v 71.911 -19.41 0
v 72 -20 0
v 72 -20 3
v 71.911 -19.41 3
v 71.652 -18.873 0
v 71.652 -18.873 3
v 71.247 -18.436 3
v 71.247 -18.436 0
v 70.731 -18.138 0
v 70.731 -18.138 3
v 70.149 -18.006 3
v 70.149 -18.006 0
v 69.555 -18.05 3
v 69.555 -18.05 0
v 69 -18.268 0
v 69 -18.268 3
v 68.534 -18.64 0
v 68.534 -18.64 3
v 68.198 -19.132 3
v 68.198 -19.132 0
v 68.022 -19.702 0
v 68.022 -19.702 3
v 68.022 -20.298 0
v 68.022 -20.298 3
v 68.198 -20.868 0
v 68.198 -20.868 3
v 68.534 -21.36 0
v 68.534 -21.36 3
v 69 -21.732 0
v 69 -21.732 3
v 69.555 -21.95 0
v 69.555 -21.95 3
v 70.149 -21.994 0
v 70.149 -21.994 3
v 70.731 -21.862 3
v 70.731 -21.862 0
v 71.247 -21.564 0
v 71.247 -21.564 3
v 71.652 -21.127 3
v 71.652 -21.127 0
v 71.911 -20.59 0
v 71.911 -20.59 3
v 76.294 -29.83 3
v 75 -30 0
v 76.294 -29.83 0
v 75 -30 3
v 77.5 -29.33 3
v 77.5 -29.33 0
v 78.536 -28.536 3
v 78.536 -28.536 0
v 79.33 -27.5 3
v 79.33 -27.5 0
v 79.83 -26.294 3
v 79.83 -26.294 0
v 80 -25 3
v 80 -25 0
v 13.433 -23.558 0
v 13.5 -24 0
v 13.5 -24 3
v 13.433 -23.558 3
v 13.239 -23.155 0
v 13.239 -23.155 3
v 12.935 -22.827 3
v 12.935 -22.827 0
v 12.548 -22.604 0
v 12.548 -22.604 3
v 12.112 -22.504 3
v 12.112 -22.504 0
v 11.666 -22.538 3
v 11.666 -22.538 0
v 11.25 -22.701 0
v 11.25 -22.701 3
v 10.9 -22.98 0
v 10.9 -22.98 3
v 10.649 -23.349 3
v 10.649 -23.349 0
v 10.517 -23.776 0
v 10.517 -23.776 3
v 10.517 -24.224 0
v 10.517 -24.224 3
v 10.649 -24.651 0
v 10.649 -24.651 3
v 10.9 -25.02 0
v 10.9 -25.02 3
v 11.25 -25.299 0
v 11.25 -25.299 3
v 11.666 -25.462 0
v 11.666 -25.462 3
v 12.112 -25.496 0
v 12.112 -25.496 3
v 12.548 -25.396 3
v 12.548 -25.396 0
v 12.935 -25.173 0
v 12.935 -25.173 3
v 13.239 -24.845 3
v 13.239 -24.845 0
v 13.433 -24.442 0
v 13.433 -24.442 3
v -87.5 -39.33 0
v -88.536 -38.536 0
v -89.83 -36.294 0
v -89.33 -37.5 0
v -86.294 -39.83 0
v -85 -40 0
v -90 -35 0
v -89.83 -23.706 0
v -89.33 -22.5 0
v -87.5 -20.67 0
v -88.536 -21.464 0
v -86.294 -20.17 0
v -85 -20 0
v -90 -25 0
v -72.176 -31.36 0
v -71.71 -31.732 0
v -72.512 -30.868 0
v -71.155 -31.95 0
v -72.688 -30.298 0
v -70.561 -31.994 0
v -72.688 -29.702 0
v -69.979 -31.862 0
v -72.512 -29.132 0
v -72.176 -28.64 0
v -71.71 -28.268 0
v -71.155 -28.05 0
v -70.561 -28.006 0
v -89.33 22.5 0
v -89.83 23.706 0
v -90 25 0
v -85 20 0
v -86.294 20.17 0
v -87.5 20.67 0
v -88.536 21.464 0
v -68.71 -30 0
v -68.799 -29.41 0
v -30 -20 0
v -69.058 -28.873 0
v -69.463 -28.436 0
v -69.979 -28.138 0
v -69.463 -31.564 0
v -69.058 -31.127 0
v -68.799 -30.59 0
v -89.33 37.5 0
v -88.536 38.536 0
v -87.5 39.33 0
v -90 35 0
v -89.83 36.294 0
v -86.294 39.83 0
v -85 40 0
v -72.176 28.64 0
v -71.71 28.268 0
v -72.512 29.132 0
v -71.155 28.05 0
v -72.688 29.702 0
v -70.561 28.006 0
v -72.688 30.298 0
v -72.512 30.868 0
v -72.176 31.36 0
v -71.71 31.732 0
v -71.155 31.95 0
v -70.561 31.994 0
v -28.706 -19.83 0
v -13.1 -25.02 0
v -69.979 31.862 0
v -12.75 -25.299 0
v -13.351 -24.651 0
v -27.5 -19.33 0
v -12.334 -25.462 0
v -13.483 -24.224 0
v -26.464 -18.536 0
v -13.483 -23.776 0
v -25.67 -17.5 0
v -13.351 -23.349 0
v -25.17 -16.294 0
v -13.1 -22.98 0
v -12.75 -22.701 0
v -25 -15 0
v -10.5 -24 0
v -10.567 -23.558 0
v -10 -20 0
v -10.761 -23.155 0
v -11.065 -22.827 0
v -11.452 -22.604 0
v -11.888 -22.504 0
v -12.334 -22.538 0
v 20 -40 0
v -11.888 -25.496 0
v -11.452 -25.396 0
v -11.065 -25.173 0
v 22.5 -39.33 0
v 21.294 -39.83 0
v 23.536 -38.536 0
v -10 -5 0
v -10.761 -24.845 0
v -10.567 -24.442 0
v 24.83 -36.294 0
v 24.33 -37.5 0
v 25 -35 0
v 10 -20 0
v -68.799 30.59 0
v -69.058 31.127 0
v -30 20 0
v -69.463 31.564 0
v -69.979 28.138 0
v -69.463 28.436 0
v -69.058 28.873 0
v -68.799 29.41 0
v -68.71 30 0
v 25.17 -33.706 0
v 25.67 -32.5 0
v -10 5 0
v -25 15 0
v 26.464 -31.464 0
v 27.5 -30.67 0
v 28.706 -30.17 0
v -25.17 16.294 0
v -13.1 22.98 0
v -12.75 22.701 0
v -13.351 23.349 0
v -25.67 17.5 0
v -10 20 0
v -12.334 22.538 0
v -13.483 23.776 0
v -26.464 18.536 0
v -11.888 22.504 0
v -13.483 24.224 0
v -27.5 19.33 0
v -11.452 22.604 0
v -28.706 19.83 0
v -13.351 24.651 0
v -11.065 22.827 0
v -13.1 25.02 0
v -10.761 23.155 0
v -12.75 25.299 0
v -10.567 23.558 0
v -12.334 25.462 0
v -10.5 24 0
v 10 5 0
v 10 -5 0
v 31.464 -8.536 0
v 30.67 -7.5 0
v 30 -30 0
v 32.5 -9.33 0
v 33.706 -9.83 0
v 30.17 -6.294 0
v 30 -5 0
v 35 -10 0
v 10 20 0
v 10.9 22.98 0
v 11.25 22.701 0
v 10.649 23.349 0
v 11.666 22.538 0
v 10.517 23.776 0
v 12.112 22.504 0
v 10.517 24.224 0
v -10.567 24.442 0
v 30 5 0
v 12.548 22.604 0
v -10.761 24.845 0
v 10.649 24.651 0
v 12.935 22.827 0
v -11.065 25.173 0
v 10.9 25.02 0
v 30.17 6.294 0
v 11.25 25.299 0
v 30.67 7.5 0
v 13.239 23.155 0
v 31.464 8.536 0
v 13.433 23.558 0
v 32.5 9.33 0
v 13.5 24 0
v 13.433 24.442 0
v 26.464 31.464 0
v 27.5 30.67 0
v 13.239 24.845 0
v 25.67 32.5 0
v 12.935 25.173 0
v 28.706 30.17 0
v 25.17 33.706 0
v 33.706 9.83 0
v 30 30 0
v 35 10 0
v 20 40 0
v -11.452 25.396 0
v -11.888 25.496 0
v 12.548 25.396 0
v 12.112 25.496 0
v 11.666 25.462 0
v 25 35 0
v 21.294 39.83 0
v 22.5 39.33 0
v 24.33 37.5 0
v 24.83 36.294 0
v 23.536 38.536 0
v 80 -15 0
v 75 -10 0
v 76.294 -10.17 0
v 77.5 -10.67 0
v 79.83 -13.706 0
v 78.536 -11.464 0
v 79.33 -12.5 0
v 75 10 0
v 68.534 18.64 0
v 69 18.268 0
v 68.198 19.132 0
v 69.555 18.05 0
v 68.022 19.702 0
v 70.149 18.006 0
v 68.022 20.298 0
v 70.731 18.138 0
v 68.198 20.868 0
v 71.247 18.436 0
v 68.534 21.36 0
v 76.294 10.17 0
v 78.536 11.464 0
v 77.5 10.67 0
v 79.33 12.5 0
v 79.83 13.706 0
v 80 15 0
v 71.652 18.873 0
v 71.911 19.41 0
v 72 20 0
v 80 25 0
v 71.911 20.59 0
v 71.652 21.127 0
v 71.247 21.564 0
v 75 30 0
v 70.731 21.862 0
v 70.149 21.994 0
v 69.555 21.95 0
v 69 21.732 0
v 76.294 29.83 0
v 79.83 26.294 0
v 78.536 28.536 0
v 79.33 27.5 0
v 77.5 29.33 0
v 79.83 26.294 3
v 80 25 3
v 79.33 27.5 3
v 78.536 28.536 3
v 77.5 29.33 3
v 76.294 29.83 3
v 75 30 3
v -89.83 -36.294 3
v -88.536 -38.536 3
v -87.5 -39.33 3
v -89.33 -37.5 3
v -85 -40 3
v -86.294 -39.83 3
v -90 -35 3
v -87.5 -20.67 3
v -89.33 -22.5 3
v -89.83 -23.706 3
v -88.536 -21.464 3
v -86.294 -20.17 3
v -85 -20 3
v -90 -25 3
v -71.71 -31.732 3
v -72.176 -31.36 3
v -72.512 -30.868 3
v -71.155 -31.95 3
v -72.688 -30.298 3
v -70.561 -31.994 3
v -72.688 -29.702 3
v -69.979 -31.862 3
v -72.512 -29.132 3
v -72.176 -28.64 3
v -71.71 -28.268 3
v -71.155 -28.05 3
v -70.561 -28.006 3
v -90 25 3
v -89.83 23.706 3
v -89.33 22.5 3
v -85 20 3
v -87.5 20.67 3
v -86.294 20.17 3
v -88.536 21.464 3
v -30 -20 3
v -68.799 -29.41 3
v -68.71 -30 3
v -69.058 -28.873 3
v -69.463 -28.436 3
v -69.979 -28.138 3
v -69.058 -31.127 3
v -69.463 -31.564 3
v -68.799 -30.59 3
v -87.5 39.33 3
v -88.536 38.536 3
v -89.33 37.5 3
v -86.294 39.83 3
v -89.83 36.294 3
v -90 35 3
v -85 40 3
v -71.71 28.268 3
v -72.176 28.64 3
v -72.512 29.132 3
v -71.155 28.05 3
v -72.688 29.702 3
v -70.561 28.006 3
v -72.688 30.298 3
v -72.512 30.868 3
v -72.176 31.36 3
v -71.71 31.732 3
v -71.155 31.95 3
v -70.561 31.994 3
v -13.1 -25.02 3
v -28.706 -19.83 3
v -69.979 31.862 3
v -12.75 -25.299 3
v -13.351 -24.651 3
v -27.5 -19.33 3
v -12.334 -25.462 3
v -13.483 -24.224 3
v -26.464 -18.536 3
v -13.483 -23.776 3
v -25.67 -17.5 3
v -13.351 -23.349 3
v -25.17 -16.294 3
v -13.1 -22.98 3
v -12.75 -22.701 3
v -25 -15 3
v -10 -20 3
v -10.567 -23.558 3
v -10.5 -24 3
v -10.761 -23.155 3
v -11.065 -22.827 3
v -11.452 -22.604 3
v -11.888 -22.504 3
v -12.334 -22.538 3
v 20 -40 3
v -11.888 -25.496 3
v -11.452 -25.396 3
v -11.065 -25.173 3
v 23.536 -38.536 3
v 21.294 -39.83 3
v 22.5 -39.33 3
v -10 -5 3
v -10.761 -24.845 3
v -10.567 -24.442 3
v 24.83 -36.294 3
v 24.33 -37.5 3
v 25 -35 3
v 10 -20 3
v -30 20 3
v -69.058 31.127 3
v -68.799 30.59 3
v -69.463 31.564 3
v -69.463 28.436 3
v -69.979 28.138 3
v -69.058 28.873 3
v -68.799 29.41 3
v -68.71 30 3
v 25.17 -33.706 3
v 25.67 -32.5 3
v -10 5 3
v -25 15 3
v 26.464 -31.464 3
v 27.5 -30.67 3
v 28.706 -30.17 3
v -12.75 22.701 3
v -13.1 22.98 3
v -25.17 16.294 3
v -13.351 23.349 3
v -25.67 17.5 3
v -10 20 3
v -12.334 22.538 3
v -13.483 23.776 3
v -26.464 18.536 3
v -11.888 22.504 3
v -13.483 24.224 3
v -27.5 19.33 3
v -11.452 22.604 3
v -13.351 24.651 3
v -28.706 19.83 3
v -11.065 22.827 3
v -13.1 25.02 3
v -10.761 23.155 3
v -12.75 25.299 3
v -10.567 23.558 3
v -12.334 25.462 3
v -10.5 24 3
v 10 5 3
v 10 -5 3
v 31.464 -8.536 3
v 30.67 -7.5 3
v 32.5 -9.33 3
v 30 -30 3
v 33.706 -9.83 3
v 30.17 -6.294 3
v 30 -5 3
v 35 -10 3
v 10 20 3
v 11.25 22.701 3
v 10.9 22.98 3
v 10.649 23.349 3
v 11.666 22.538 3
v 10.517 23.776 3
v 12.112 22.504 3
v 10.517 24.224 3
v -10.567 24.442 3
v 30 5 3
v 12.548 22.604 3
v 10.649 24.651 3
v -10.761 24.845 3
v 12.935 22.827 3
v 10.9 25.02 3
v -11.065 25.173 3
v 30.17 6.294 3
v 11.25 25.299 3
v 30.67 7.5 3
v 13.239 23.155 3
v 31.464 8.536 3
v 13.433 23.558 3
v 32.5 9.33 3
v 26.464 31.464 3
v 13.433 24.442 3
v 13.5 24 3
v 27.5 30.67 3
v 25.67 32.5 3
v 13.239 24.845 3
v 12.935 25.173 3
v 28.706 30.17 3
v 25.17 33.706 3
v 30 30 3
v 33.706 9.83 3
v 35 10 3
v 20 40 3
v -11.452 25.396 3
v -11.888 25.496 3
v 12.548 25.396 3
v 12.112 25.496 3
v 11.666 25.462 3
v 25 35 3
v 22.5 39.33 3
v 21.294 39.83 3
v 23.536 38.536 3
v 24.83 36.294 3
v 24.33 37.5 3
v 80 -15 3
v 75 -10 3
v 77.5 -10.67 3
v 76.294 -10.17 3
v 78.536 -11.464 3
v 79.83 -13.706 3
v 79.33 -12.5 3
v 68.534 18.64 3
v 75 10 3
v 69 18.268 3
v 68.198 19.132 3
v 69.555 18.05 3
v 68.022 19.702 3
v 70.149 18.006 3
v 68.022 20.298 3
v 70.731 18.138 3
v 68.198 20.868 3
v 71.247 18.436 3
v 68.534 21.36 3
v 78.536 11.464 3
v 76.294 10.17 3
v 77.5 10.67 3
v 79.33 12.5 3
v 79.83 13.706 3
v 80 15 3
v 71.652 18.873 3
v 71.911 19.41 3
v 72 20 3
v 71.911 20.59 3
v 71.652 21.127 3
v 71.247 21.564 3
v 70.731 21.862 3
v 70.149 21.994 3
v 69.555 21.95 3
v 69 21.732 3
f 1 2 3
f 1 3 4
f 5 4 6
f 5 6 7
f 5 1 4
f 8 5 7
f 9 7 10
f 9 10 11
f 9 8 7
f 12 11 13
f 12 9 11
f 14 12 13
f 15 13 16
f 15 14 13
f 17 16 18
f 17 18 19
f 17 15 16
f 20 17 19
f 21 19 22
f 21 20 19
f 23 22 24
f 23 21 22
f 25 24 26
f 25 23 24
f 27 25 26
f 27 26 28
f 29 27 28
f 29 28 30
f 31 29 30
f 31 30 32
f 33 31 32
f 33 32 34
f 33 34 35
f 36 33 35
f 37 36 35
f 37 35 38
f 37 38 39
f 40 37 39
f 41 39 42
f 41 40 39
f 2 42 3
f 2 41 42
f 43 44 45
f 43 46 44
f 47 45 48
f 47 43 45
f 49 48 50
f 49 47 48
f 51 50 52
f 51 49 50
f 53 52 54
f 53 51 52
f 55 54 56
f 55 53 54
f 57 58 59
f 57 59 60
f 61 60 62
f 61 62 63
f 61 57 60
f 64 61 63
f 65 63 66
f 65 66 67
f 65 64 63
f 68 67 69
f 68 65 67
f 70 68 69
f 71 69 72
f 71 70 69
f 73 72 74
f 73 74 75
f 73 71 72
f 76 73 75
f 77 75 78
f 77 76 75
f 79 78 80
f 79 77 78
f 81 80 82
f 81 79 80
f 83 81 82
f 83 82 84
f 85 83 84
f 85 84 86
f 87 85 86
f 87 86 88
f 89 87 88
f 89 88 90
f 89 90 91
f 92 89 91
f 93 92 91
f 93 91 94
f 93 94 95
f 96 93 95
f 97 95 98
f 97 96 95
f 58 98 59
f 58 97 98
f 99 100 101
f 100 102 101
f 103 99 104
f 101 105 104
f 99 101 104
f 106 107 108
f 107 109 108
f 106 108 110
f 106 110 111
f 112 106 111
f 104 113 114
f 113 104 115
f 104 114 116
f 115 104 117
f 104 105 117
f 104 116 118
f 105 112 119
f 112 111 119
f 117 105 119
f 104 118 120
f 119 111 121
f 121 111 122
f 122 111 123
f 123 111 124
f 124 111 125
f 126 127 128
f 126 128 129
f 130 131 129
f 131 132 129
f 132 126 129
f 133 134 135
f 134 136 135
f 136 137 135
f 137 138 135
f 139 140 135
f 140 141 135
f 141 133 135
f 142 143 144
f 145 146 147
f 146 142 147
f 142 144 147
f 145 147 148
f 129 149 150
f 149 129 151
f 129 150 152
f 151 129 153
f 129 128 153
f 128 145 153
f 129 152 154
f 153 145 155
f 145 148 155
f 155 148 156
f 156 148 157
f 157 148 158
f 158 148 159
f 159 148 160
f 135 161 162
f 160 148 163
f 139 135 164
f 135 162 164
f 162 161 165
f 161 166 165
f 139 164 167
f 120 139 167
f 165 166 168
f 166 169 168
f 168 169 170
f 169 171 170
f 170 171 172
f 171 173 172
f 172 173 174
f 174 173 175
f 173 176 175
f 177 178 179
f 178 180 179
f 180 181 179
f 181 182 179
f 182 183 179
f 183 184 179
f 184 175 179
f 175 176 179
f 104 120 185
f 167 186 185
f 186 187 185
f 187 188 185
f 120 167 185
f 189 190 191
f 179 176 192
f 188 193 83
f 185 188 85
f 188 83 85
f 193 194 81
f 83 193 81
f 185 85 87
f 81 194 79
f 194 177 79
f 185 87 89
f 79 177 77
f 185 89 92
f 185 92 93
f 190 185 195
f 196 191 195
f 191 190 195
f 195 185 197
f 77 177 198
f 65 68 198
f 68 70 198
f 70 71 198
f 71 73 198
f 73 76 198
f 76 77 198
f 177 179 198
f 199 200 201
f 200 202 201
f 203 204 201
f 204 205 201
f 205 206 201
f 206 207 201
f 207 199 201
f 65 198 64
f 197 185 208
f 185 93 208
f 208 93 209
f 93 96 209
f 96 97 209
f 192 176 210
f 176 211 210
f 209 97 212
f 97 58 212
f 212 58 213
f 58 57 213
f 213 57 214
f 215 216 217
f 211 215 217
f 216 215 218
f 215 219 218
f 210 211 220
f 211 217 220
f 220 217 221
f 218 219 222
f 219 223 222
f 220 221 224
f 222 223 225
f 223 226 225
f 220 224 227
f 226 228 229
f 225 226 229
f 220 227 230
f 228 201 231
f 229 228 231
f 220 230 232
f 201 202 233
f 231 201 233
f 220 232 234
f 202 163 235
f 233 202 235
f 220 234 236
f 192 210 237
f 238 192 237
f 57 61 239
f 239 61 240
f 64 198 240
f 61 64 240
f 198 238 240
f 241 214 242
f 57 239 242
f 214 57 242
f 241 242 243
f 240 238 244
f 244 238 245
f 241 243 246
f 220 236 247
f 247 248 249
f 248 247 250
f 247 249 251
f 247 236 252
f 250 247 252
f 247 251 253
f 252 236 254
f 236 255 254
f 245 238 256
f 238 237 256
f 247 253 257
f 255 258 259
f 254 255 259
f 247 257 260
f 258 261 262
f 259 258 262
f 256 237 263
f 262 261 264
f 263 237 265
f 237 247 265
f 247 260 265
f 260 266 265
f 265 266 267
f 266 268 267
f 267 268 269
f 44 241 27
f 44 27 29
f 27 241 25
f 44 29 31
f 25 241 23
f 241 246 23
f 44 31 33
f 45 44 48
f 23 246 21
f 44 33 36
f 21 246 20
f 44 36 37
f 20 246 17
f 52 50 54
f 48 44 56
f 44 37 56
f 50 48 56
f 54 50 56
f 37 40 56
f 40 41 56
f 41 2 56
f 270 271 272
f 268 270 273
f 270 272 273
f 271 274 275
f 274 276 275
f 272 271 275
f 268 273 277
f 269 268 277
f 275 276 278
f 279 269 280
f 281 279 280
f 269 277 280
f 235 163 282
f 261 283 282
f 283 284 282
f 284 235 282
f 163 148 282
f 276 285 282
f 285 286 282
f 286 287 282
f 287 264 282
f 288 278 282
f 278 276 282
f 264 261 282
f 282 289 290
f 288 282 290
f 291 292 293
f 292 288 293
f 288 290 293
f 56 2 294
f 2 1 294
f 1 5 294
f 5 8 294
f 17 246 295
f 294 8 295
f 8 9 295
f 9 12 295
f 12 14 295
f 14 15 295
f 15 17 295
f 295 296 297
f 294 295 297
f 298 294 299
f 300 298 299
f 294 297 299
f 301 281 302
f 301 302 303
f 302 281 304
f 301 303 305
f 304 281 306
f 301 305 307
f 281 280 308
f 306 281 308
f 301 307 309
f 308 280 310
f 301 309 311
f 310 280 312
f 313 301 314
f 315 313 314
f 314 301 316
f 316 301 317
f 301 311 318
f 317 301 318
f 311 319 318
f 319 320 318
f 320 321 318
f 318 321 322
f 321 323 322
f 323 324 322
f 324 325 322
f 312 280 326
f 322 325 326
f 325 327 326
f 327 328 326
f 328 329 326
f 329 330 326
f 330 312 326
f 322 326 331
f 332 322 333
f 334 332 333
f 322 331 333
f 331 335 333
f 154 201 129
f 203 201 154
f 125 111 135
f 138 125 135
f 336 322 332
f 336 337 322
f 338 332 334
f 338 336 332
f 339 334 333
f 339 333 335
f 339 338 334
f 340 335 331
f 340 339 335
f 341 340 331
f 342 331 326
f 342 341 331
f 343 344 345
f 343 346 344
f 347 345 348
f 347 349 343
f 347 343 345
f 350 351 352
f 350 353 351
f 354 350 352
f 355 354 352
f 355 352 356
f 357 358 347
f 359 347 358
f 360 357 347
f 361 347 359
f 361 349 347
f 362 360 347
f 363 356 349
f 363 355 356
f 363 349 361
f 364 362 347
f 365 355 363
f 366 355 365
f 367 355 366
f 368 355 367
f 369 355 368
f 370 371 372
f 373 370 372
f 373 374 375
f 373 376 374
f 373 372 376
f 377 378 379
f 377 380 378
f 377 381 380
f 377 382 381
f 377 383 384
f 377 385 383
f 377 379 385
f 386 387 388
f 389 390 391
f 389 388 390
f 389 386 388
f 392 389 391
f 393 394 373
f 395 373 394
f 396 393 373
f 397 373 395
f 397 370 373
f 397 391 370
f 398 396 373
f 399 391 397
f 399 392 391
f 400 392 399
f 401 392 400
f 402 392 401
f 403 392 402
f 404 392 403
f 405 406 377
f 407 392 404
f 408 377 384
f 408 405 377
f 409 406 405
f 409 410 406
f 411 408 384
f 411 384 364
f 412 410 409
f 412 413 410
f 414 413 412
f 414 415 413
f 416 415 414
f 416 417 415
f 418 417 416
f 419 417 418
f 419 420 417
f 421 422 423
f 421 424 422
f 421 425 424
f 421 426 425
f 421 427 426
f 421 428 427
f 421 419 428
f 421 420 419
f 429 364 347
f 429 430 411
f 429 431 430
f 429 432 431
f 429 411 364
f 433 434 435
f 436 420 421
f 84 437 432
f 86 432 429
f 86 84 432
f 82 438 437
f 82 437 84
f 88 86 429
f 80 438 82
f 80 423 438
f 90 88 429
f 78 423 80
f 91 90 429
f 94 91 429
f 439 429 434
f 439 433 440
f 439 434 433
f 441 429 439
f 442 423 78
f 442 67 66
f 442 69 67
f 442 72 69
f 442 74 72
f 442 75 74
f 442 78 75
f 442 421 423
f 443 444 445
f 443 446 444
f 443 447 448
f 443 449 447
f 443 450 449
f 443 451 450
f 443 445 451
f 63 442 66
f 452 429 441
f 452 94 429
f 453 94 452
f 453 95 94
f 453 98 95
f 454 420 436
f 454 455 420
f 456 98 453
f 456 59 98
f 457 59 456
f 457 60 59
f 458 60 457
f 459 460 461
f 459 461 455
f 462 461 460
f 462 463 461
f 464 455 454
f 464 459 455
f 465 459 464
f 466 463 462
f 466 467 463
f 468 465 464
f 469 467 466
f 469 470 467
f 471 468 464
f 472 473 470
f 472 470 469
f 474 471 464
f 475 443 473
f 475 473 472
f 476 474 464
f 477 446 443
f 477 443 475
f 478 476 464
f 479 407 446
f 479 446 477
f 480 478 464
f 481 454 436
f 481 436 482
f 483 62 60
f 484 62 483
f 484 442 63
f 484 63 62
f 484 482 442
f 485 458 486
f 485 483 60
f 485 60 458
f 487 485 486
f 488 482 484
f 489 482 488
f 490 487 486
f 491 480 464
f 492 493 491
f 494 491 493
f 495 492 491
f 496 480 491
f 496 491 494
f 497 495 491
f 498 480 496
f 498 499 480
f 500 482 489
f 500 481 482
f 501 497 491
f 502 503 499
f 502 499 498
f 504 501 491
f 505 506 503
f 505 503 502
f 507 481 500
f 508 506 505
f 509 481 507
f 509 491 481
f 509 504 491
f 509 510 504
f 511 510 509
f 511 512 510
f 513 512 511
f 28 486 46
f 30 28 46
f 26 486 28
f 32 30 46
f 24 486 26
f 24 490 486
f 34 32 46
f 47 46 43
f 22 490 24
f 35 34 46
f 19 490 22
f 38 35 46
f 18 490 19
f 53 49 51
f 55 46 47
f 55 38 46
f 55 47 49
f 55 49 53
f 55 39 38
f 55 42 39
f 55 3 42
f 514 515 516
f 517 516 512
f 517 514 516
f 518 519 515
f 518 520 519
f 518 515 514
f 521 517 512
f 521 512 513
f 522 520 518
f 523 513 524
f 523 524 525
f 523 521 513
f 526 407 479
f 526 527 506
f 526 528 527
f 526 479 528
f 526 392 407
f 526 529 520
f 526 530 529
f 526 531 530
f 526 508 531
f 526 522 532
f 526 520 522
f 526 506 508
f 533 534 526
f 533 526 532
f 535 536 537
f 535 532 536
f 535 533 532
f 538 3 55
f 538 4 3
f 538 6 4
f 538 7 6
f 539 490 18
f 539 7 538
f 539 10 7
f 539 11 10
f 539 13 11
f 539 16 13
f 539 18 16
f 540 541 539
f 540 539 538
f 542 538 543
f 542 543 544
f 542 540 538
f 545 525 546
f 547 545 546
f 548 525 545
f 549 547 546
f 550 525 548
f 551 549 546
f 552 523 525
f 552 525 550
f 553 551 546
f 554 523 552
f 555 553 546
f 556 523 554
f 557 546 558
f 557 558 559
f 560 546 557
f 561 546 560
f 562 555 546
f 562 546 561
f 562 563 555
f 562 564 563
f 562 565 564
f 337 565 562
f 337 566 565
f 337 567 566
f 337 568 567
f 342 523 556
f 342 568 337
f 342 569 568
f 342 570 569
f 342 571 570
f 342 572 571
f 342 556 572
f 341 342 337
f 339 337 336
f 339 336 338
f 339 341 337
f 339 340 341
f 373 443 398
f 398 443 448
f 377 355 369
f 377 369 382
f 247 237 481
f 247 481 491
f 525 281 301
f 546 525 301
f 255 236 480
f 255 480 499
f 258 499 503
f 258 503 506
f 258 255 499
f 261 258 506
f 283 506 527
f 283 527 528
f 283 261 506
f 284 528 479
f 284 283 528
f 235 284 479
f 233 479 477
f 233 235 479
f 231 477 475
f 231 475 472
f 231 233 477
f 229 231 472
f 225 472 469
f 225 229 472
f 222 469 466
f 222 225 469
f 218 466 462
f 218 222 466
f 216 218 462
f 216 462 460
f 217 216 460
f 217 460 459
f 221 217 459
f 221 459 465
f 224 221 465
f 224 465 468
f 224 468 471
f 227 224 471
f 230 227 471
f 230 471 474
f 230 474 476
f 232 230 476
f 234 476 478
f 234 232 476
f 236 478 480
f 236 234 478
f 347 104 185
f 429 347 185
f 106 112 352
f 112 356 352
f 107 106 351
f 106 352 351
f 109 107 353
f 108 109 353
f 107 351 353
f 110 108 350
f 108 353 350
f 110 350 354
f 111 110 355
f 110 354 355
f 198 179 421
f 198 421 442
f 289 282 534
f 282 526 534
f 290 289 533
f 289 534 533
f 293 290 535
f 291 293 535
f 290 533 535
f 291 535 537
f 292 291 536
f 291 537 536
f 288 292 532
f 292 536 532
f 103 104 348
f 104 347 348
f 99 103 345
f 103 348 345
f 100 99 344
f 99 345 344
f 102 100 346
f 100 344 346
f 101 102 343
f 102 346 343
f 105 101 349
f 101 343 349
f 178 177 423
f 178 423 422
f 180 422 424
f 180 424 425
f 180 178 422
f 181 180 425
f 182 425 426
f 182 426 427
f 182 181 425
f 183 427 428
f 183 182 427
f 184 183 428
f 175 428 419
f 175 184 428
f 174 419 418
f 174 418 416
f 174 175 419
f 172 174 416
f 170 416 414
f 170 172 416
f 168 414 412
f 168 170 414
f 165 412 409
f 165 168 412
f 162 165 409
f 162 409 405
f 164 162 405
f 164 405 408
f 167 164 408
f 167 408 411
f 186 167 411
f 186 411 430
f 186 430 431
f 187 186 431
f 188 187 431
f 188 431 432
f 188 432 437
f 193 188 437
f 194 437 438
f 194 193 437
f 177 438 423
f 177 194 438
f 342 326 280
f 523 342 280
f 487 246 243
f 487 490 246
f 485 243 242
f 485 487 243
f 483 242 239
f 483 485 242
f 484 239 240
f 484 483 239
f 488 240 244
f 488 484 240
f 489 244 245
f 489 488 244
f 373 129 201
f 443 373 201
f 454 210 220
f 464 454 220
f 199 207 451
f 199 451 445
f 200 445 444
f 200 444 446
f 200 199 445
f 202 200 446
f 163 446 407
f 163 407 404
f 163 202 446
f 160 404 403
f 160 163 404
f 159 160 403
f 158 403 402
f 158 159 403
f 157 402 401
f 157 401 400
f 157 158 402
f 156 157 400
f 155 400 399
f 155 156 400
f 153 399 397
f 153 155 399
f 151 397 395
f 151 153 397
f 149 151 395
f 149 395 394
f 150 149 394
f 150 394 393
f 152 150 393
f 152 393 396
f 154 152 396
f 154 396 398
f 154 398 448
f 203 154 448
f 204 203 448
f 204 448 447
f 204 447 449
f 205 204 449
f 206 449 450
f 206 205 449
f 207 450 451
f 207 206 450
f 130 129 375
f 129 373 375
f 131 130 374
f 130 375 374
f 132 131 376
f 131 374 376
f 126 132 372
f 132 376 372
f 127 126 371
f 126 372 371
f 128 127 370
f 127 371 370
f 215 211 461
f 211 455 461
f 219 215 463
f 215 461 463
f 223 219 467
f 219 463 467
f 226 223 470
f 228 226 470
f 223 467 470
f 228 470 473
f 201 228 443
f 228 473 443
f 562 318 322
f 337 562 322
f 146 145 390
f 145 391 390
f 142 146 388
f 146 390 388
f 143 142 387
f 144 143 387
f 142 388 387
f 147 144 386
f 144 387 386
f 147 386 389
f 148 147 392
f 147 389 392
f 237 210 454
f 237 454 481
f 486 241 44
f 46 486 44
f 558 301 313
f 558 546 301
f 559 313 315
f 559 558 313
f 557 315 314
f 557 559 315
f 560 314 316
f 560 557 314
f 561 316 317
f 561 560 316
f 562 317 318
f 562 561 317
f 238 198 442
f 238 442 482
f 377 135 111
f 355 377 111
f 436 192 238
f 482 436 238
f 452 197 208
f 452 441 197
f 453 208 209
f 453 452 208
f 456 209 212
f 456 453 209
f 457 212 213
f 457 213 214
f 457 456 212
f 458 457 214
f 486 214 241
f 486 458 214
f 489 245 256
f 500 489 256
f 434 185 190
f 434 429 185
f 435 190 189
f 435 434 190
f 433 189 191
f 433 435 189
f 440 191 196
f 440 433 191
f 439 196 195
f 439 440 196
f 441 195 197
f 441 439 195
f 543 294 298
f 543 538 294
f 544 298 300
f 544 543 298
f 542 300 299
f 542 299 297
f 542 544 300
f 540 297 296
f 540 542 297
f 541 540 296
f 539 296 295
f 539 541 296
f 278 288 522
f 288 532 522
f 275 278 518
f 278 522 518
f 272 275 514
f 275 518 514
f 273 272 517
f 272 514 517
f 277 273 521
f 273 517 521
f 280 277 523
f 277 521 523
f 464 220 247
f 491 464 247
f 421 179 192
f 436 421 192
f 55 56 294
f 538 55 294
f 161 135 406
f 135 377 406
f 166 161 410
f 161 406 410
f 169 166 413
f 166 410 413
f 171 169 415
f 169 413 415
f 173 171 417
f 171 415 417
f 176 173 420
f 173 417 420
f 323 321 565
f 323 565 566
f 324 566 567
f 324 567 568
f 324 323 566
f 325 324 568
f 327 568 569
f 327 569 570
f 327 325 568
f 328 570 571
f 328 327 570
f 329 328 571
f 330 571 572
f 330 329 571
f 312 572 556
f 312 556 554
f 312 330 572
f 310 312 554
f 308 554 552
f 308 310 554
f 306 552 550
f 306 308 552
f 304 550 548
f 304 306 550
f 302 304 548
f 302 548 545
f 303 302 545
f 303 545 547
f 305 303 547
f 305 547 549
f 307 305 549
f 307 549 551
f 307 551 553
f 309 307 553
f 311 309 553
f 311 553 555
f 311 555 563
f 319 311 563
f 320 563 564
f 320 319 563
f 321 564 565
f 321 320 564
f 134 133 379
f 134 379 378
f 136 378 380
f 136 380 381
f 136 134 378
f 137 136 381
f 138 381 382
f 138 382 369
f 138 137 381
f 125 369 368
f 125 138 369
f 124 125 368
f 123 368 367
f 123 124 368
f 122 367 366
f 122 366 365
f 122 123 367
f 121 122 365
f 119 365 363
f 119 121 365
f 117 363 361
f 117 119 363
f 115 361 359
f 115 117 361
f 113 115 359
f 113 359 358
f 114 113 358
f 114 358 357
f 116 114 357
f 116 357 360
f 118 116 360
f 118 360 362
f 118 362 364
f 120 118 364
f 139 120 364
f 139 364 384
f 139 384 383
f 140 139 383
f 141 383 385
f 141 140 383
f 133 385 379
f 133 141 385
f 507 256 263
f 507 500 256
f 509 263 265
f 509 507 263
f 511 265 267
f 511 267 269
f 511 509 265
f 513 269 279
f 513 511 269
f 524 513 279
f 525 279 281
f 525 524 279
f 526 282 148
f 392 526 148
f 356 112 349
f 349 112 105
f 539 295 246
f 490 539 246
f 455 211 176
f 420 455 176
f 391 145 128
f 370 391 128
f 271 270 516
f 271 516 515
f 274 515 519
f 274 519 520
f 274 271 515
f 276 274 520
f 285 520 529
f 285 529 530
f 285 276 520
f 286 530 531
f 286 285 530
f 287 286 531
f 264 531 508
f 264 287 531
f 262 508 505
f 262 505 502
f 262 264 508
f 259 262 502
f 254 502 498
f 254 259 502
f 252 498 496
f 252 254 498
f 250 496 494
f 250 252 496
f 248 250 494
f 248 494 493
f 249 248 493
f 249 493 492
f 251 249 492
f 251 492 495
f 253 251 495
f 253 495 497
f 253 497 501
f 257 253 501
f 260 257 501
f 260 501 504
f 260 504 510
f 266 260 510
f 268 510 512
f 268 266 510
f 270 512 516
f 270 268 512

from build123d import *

# Parameters (mm, degrees)
CROQUIS18_R             = 2
CROQUIS18_R_2           = 1.5
CROQUIS18_W             = 20
CROQUIS18_H             = 15
SALIENTE_EXTRUIR1_DEPTH = 3
REDONDEO1_R             = 5


with BuildPart() as part:
    # Croquis18 → Saliente-Extruir1 (new body)
    with BuildSketch(Plane.XY):
        Polygon((-90, -40), (25, -40), (25, -30), (80, -30), (80, -10), (30, -10), (30, 10), (80, 10), (80, 30), (25, 30), (25, 40), (-90, 40), (-90, 20), (-25, 20), (-25, -20), (-90, -20), align=None)
        with Locations((-70.71, -30)):
            Circle(CROQUIS18_R, mode=Mode.SUBTRACT)
        with Locations((-12, -24)):
            Circle(CROQUIS18_R_2, mode=Mode.SUBTRACT)
        with Locations((12, -24)):
            Circle(CROQUIS18_R_2, mode=Mode.SUBTRACT)
        with Locations((70, -20)):
            Circle(CROQUIS18_R, mode=Mode.SUBTRACT)
        with Locations((0, -12.5)):
            Rectangle(CROQUIS18_W, CROQUIS18_H, mode=Mode.SUBTRACT)
        with Locations((-70.71, 30)):
            Circle(CROQUIS18_R, mode=Mode.SUBTRACT)
        with Locations((-12, 24)):
            Circle(CROQUIS18_R_2, mode=Mode.SUBTRACT)
        with Locations((0, 12.5)):
            Rectangle(CROQUIS18_W, CROQUIS18_H, mode=Mode.SUBTRACT)
        with Locations((70, 20)):
            Circle(CROQUIS18_R, mode=Mode.SUBTRACT)
        with Locations((12, 24)):
            Circle(CROQUIS18_R_2, mode=Mode.SUBTRACT)
    extrude(amount=SALIENTE_EXTRUIR1_DEPTH)

    # Redondeo1
    redondeo1_edges = [part.edges().sort_by_distance(p)[0] for p in [
        (25, -40, 1.5),
        (25, -30, 1.5),
        (25, 40, 1.5),
        (25, 30, 1.5),
        (-25, -20, 1.5),
        (-25, 20, 1.5),
        (-90, -40, 1.5),
        (-90, -20, 1.5),
        (-90, 20, 1.5),
        (-90, 40, 1.5),
        (80, 30, 1.5),
        (80, -30, 1.5),
        (30, -10, 1.5),
        (30, 10, 1.5),
        (80, -10, 1.5),
        (80, 10, 1.5),
    ]]
    fillet(redondeo1_edges, radius=REDONDEO1_R - 0.0001)  # a hair under: the kernel refuses the full size


solid = part.part
